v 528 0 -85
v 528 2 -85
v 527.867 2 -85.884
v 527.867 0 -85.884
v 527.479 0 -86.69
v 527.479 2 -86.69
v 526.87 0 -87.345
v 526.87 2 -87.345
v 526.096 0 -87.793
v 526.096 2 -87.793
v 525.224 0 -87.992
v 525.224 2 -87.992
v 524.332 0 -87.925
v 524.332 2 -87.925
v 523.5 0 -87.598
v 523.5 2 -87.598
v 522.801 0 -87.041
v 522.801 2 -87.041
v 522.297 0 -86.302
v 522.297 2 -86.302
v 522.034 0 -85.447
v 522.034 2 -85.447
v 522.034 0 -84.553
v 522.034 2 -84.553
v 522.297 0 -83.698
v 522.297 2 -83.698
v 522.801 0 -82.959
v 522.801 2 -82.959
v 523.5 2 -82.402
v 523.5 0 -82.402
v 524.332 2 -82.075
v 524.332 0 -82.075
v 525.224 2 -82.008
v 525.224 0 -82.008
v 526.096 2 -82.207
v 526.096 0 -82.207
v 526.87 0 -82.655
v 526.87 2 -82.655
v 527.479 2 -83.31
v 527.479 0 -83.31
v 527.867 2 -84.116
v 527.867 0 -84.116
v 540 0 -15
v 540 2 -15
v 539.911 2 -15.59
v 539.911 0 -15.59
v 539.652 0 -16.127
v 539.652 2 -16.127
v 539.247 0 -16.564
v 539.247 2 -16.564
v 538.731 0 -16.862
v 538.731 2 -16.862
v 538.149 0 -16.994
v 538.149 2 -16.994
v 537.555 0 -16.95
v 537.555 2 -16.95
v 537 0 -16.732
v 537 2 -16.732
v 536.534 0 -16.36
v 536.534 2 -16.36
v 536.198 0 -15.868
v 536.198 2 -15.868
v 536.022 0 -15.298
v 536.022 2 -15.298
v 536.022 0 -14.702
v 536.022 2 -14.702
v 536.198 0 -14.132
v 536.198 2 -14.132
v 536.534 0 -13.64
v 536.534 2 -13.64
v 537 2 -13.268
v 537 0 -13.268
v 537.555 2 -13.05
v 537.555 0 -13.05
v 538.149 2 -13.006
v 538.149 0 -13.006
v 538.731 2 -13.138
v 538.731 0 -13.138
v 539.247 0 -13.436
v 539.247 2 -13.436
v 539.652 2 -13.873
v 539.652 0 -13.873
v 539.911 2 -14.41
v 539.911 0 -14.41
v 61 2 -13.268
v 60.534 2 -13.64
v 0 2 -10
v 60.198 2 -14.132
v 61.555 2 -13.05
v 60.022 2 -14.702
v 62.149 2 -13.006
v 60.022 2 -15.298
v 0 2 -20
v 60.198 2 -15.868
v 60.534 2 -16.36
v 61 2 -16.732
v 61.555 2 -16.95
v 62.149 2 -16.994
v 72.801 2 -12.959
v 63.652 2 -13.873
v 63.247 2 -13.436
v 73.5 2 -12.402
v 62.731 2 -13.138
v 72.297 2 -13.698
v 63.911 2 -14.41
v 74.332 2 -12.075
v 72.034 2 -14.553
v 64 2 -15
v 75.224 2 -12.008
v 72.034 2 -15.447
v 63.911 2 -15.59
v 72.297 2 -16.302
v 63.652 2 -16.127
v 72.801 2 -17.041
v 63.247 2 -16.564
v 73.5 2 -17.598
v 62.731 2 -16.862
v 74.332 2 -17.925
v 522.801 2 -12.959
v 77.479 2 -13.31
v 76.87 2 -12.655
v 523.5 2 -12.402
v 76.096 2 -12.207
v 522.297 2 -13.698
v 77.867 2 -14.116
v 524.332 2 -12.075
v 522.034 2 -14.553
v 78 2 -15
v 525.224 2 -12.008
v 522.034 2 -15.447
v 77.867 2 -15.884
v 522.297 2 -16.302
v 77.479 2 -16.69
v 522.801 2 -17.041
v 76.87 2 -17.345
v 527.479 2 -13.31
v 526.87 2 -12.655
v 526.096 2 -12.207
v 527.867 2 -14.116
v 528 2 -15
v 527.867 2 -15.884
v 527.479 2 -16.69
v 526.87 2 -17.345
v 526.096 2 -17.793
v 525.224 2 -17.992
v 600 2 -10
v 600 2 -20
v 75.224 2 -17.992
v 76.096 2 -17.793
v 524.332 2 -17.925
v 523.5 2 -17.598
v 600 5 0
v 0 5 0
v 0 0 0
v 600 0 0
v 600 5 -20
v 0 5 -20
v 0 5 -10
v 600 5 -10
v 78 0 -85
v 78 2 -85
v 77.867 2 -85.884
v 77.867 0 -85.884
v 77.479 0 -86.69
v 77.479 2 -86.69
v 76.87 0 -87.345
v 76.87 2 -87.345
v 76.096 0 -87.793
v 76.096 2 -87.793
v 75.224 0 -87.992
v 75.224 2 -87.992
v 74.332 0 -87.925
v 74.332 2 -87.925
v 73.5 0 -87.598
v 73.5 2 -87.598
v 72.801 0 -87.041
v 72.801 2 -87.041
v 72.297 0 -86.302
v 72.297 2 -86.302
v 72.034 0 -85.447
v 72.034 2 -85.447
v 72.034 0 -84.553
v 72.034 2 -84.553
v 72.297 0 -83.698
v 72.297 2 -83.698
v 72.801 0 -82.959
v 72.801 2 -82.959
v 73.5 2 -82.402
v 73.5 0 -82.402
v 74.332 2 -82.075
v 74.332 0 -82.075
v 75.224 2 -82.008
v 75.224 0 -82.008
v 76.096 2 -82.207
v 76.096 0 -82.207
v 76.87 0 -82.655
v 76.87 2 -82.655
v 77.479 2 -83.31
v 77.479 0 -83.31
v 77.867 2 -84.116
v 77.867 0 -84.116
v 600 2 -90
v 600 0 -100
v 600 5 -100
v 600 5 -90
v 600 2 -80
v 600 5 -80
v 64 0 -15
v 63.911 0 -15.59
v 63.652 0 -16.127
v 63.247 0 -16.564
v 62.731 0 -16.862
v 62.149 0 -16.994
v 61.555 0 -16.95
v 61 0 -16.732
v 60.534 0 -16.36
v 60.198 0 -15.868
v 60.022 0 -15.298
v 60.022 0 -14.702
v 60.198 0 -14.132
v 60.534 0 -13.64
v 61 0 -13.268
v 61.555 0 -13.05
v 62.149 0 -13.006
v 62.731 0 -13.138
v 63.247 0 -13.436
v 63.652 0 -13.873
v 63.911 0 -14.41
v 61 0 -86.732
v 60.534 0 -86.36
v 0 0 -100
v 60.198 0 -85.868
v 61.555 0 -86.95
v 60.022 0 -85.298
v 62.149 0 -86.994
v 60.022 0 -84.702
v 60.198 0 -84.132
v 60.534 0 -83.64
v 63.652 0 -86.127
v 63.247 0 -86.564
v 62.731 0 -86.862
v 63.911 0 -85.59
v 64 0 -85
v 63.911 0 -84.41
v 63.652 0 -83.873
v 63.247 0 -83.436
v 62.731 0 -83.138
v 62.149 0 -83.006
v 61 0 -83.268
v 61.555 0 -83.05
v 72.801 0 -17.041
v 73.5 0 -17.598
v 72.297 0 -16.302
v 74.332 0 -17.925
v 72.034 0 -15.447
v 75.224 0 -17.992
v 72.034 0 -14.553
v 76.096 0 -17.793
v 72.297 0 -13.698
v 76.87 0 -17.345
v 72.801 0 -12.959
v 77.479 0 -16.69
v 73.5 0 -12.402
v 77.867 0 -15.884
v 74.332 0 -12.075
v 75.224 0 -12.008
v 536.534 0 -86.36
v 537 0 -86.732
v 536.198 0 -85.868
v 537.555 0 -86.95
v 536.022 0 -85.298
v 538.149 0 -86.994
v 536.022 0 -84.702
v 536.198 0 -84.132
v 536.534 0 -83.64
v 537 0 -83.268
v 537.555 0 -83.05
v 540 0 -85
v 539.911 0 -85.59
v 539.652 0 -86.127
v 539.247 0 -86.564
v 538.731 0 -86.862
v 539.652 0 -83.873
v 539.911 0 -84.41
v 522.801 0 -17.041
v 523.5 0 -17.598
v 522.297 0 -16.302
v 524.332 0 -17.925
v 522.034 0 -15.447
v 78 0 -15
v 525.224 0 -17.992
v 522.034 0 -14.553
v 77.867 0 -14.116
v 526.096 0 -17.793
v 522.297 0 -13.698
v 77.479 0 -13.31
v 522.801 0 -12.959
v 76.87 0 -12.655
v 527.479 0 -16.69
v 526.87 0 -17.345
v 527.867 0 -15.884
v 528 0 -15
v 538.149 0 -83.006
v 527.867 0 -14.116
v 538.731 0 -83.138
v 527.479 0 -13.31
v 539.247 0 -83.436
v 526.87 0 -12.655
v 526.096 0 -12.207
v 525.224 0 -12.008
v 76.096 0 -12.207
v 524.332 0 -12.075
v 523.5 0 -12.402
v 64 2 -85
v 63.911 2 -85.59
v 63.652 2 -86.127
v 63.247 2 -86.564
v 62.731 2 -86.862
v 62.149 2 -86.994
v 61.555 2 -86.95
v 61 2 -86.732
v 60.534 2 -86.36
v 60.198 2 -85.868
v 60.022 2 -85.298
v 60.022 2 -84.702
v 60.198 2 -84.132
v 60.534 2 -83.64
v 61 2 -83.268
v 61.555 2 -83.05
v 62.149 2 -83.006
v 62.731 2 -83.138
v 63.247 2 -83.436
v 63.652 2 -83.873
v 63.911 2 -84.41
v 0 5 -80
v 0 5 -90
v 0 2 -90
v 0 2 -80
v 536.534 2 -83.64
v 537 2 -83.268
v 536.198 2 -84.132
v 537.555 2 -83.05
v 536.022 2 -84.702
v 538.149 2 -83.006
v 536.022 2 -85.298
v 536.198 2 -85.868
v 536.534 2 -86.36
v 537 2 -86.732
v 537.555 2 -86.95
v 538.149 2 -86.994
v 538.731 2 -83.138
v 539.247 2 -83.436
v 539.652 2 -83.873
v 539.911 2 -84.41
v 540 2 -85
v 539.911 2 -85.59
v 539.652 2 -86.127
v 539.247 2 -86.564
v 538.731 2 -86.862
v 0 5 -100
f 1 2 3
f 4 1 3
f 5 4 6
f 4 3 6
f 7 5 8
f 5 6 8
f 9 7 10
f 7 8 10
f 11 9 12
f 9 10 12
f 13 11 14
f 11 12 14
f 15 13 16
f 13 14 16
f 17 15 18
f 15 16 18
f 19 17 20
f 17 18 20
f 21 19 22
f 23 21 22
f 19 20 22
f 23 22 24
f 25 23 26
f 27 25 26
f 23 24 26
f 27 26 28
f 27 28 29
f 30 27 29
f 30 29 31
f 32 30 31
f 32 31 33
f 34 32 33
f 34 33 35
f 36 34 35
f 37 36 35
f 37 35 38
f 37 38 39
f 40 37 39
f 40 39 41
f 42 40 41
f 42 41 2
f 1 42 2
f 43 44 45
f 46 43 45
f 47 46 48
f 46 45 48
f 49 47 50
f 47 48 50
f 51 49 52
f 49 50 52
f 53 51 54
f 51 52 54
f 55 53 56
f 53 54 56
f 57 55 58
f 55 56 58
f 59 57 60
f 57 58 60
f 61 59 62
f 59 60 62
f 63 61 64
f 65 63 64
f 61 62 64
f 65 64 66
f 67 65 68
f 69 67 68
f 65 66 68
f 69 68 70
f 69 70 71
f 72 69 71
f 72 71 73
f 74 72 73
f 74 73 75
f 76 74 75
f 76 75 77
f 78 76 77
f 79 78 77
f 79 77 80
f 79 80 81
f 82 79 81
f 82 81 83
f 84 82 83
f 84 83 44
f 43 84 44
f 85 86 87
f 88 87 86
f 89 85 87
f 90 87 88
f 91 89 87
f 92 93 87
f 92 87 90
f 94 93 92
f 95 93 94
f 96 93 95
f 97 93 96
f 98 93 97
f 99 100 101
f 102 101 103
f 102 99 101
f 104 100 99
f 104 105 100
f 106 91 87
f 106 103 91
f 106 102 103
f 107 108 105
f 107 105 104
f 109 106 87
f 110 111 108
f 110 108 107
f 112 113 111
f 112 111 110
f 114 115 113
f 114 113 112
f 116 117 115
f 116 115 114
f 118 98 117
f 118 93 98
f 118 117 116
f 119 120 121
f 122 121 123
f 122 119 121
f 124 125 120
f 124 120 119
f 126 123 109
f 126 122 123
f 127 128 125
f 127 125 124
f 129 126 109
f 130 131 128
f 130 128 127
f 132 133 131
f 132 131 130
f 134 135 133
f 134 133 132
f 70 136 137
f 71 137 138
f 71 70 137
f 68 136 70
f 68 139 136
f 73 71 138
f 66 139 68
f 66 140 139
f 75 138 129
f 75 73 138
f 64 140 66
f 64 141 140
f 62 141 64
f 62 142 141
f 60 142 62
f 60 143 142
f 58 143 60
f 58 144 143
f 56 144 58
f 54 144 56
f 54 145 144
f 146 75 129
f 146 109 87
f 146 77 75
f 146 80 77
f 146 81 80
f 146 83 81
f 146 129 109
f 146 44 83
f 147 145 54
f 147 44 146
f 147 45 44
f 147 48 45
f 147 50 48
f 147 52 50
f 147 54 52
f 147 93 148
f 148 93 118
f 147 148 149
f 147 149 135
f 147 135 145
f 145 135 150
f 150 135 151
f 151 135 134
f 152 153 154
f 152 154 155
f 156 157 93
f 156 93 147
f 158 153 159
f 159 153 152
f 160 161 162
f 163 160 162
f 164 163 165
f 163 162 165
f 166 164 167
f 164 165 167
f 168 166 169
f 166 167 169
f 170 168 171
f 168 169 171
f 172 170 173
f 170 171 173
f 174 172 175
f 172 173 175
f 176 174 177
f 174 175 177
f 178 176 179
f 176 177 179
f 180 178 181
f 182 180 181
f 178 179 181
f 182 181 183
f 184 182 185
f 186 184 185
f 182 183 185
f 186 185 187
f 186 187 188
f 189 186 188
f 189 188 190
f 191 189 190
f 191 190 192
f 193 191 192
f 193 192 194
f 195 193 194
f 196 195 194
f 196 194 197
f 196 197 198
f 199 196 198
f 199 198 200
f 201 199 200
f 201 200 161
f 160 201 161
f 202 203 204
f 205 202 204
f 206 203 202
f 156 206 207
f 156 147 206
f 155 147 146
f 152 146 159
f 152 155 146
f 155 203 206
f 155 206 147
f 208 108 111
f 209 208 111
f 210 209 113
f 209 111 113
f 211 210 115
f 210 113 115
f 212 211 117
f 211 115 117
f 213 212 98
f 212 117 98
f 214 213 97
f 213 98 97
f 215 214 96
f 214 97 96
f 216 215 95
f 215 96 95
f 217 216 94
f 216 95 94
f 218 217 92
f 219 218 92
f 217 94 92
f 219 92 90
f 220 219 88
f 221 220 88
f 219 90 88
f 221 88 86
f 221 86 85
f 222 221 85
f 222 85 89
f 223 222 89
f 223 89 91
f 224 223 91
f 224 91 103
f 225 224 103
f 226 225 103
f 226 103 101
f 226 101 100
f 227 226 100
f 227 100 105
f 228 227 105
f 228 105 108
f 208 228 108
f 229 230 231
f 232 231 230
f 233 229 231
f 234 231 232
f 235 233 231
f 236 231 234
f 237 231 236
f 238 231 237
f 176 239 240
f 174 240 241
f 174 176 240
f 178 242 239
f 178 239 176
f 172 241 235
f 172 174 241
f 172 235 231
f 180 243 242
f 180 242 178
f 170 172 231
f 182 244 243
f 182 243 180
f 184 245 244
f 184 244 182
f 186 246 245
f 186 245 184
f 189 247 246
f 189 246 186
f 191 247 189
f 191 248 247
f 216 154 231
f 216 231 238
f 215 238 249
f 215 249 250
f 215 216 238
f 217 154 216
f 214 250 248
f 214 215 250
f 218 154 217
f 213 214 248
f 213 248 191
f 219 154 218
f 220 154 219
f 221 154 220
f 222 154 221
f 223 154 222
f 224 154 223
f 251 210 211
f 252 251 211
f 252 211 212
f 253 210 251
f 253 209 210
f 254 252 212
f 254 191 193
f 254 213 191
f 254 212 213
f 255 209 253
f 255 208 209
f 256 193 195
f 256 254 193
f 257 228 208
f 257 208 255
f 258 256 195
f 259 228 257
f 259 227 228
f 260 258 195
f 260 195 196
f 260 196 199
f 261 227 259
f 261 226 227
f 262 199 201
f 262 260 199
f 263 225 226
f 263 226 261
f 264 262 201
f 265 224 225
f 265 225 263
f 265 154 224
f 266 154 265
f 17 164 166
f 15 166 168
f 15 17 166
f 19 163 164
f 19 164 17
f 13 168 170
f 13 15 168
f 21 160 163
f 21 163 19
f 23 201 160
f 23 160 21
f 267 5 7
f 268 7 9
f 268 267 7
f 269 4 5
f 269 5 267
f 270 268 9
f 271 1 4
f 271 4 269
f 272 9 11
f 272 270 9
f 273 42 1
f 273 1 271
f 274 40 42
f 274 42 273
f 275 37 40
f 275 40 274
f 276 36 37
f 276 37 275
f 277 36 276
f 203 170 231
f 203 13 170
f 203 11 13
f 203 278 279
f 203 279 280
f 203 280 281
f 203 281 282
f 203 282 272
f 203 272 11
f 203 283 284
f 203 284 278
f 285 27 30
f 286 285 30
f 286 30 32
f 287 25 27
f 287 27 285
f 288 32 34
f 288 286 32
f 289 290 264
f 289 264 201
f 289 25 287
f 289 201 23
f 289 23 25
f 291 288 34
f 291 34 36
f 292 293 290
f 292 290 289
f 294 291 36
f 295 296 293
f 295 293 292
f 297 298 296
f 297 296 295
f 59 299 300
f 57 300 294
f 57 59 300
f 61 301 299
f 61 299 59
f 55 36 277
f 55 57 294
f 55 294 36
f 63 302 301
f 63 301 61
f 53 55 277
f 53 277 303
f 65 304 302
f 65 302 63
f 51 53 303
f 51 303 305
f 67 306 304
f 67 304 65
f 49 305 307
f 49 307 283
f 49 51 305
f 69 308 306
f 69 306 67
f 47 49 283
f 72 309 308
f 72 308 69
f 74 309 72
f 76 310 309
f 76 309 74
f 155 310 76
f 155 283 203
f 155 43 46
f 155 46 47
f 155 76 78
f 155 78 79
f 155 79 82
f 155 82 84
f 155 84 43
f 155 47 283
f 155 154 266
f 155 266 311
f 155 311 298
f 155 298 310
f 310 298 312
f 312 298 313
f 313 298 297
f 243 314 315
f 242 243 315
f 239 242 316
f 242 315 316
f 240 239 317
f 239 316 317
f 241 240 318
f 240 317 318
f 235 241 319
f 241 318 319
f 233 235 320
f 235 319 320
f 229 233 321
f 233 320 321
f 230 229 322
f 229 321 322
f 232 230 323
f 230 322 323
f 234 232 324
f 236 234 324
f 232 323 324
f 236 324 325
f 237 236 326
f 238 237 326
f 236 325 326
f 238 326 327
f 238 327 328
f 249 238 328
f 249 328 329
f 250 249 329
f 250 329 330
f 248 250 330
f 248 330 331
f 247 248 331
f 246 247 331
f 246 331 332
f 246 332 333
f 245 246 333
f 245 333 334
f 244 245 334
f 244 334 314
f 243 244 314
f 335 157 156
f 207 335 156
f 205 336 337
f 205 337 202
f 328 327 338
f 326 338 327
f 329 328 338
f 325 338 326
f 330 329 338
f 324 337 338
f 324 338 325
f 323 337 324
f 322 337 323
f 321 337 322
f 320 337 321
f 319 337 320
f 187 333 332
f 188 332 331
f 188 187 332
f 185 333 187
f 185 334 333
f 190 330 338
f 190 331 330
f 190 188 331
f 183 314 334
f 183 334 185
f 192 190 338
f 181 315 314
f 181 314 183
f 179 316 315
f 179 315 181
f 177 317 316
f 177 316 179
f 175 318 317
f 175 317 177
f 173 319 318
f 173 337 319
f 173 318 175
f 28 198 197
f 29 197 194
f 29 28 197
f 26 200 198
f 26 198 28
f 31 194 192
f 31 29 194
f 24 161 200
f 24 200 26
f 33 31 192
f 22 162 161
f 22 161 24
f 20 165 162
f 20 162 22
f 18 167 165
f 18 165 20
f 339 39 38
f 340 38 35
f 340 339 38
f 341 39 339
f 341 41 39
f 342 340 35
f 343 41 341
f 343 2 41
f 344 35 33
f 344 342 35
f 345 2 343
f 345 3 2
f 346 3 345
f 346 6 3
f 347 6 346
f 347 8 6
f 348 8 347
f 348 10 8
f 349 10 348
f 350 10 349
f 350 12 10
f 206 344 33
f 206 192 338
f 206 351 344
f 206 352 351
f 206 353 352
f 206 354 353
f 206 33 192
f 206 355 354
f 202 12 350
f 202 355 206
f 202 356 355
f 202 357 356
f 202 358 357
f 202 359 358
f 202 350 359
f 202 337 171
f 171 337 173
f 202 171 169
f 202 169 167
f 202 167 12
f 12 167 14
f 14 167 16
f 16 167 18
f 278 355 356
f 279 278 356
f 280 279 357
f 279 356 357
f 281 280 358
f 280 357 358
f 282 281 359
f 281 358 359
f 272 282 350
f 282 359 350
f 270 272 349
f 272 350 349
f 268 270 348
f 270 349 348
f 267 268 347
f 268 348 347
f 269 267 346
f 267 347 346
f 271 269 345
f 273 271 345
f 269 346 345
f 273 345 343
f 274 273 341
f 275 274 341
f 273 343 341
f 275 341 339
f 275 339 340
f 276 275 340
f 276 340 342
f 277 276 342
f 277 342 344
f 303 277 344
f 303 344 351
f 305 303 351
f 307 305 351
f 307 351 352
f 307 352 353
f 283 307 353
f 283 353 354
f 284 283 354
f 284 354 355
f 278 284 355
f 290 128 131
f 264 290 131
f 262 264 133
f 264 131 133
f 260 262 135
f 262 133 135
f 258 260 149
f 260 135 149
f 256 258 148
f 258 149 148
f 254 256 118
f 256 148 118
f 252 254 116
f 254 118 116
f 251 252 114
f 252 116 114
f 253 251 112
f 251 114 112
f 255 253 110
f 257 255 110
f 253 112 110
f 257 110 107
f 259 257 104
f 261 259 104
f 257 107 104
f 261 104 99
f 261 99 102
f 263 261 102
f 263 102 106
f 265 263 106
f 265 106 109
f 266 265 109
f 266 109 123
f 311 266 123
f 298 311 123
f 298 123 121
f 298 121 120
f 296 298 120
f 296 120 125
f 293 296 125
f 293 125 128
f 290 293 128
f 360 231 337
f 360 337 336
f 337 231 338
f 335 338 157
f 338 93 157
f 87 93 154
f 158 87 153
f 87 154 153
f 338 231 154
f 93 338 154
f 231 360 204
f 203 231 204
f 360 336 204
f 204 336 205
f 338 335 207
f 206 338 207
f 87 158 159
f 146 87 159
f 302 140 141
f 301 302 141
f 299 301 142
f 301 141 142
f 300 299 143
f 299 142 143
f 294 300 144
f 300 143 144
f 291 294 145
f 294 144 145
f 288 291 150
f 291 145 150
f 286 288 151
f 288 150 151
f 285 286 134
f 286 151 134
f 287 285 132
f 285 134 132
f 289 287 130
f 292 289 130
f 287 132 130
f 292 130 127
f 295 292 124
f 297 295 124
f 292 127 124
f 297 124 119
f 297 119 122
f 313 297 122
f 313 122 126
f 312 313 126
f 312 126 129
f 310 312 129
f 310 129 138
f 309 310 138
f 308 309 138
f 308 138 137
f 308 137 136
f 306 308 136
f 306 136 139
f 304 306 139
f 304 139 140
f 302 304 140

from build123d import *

# Parameters (mm, degrees)
SKETCH1_W           = 600
SKETCH1_H           = 5
BOSS_EXTRUDE1_DEPTH = 100
SKETCH5_W           = 600
SKETCH5_H           = 10
CUT_EXTRUDE1_DEPTH  = 3
SKETCH6_R           = 2
CUT_EXTRUDE2_DEPTH  = 6
SKETCH7_R           = 3
CUT_EXTRUDE3_DEPTH  = 6


with BuildPart() as part:
    # Sketch1 → Boss-Extrude1 (new body)
    with BuildSketch(Plane.XY):
        with Locations((300, 2.5)):
            Rectangle(SKETCH1_W, SKETCH1_H)
    extrude(amount=-BOSS_EXTRUDE1_DEPTH)

    # Sketch5 → Cut-Extrude1 (cut)
    with BuildSketch(Plane(origin=(0, 5, 0), x_dir=(1, 0, 0), z_dir=(0, 1, 0))):
        with Locations((300, 85)):
            Rectangle(SKETCH5_W, SKETCH5_H)
        with Locations((300, 15)):
            Rectangle(SKETCH5_W, SKETCH5_H)
    extrude(amount=-CUT_EXTRUDE1_DEPTH, mode=Mode.SUBTRACT)

    # Sketch6 → Cut-Extrude2 (cut, through all)
    with BuildSketch(Plane(origin=(0, 5, 0), x_dir=(1, 0, 0), z_dir=(0, 1, 0))):
        with Locations((62, 85)):
            Circle(SKETCH6_R)
        with Locations((62, 15)):
            Circle(SKETCH6_R)
        with Locations((538, 85)):
            Circle(SKETCH6_R)
        with Locations((538, 15)):
            Circle(SKETCH6_R)
    extrude(amount=-CUT_EXTRUDE2_DEPTH, mode=Mode.SUBTRACT)

    # Sketch7 → Cut-Extrude3 (cut, through all)
    with BuildSketch(Plane(origin=(0, 5, 0), x_dir=(1, 0, 0), z_dir=(0, 1, 0))):
        with Locations((75, 85)):
            Circle(SKETCH7_R)
        with Locations((75, 15)):
            Circle(SKETCH7_R)
        with Locations((525, 85)):
            Circle(SKETCH7_R)
        with Locations((525, 15)):
            Circle(SKETCH7_R)
    extrude(amount=-CUT_EXTRUDE3_DEPTH, mode=Mode.SUBTRACT)


solid = part.part
